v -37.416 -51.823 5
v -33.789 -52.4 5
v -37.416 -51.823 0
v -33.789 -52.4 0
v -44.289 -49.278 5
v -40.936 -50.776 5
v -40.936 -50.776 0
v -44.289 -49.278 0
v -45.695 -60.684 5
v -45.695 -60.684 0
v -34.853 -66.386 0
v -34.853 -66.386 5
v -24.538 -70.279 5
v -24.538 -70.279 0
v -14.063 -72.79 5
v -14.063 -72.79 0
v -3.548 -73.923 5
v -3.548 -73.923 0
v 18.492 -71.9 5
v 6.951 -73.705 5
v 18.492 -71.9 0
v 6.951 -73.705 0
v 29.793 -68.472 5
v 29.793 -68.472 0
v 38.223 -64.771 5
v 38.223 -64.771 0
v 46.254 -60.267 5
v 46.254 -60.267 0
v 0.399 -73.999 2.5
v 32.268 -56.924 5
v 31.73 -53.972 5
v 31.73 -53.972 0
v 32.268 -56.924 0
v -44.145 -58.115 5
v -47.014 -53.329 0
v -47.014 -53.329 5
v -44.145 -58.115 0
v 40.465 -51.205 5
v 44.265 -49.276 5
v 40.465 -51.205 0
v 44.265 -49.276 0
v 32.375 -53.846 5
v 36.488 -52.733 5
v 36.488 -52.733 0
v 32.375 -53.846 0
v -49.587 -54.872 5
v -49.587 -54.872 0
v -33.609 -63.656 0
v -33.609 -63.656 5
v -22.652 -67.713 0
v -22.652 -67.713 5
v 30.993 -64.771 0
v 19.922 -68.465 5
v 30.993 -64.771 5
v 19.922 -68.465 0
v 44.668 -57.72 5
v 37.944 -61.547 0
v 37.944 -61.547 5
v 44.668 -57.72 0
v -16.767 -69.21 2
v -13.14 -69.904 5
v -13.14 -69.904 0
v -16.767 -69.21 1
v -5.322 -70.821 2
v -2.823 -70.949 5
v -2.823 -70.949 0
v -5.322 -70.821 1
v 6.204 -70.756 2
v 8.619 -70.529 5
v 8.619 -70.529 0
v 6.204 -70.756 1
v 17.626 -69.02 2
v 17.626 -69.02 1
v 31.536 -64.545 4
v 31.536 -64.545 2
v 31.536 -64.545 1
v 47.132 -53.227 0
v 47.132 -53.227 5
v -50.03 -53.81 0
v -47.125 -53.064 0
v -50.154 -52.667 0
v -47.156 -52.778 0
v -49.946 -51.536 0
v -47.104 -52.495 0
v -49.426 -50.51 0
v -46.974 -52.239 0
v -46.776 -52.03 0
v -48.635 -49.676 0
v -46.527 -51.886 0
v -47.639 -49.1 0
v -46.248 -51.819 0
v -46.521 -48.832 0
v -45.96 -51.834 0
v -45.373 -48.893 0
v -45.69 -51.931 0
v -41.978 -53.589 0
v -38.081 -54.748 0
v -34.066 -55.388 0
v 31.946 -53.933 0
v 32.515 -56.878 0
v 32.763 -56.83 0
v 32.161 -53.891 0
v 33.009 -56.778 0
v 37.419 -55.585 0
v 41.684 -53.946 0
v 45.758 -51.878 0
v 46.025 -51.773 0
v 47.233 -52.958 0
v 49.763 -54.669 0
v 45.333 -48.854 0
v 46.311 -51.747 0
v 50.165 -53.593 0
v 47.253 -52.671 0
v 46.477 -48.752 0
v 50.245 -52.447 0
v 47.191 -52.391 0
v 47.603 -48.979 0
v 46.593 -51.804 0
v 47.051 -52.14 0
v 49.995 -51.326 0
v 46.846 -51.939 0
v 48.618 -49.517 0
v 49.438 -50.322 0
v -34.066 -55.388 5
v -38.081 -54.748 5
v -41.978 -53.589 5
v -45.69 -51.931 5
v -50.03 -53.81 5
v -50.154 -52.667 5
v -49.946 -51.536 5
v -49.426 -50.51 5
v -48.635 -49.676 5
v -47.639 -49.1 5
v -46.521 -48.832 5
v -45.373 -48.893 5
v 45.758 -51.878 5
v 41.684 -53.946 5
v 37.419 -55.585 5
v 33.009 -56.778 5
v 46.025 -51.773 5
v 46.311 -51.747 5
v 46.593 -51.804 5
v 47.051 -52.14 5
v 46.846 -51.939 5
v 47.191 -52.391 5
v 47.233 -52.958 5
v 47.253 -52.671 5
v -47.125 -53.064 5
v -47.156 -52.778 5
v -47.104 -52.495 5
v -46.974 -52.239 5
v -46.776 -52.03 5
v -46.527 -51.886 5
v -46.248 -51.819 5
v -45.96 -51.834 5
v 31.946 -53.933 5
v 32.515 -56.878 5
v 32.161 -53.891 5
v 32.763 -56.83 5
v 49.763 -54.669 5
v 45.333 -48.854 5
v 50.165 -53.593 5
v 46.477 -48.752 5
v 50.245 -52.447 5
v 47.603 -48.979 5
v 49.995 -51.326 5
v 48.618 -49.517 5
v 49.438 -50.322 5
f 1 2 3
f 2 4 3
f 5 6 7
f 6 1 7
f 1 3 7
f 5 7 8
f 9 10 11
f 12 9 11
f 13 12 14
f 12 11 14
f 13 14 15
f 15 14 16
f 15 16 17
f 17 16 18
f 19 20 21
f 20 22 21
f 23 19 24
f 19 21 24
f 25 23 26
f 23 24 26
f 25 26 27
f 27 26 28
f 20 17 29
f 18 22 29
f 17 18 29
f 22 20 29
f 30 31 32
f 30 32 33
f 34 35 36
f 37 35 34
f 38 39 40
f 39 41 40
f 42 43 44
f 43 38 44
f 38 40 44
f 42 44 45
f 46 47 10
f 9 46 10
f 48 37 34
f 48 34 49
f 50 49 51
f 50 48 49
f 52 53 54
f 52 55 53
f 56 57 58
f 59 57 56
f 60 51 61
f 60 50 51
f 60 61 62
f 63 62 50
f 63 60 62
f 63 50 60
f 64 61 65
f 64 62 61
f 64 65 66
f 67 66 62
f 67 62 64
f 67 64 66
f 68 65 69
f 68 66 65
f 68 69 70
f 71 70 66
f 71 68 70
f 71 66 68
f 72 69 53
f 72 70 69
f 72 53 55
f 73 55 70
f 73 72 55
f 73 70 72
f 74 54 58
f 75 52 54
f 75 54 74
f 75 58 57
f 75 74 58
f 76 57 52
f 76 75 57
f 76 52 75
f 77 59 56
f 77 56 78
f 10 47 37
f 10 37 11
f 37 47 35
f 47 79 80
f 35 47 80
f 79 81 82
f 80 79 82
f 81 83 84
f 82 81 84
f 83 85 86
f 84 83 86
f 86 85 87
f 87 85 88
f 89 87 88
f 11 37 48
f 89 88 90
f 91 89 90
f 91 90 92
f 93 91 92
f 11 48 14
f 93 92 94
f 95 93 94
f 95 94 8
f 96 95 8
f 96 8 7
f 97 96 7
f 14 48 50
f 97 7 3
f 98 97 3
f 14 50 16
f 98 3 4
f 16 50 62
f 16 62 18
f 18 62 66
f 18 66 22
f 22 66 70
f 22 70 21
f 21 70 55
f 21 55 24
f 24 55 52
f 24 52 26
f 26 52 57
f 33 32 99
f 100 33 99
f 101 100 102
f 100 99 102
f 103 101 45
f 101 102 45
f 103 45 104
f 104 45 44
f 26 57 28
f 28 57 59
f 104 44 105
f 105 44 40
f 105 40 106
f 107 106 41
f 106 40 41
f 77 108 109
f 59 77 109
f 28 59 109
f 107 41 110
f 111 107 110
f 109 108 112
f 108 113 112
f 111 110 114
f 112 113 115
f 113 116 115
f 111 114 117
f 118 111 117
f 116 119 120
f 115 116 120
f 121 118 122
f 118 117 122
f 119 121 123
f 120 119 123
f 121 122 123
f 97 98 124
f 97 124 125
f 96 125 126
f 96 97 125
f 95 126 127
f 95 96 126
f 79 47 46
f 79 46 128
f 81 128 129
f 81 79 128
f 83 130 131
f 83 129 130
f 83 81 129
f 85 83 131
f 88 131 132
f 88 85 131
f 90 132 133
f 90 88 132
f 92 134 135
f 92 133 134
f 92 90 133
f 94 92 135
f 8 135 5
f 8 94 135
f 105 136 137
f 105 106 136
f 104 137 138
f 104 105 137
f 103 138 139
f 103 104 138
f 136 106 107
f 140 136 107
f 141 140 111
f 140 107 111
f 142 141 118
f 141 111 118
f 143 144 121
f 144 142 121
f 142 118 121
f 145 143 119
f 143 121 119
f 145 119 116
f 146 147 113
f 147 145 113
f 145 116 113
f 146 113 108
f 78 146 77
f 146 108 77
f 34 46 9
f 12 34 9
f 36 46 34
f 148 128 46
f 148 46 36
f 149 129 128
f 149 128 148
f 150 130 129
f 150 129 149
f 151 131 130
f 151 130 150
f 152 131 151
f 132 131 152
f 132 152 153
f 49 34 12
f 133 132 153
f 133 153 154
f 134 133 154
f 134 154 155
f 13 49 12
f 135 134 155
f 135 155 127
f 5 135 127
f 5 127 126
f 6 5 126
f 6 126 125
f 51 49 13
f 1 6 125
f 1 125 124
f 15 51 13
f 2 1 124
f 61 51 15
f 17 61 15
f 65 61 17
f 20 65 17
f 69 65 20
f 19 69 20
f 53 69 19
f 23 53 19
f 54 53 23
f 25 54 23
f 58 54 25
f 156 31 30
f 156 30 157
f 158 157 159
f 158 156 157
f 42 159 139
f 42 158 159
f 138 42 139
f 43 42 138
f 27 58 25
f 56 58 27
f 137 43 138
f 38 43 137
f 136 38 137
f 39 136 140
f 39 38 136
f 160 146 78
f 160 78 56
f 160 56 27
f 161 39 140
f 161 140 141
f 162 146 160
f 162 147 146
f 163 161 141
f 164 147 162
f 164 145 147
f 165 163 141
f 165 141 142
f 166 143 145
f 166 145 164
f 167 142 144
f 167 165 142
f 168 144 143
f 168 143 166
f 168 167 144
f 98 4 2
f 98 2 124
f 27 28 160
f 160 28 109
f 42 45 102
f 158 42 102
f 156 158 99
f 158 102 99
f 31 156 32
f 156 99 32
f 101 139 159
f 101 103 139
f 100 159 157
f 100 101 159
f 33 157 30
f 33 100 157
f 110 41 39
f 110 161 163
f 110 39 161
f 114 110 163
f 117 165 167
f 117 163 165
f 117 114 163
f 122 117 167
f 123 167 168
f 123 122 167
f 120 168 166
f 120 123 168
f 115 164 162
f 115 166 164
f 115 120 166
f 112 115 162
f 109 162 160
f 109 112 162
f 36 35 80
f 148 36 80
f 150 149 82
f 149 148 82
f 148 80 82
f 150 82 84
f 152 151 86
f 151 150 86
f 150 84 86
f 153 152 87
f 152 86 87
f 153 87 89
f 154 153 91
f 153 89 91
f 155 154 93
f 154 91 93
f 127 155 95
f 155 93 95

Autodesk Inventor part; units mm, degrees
ref_plane "YZ Plane" through (0, 0, 0) normal (1, 0, 0) x (0, 1, 0)
ref_plane "XZ Plane" through (0, 0, 0) normal (0, 1, 0) x (-1, 0, 0)
ref_plane "XY Plane" through (0, 0, 0) normal (0, 0, 1) x (1, 0, 0)
sketch "スケッチ1" plane through (0, 0, 0) normal (0, 0, 1) x (1, 0, 0)
  arc A0 (47.1325, -53.2266) -> (45.758, -51.8784) centre (46.2557, -52.7457) ccw
  arc A1 (33.009, -56.7784) -> (45.758, -51.8784) centre (23.6069, -13.28) ccw
  arc A2 (11.1932, -28.6204) -> (33.009, -56.7784) centre (28.8377, -37.4801) ccw
  arc A3 (11.1932, -28.6204) -> (-11.1841, -28.6384) centre (0, -23) ccw
  arc A4 (-22.0046, -54.1258) -> (-11.1841, -28.6384) centre (-27.3796, -36.8033) ccw
  arc A5 (-45.6895, -51.9306) -> (-22.0046, -54.1258) centre (-31.2017, -24.4856) ccw
  arc A6 (-45.6895, -51.9306) -> (-47.014, -53.3291) centre (-46.1563, -52.815) ccw
  line L0 (-47.014, -53.3291) -> (-44.145, -58.1151)
  spline S0 degree 4 poles (-44.145, -58.1151) (-43.8381, -58.3003) (-43.4088, -58.5568) (-42.8575, -58.8816) (-42.1841, -59.2711) (-41.6963, -59.5497) (-41.2094, -59.8243) (-40.7232, -60.0949) (-40.2377, -60.3617) (-39.7528, -60.6247) (-39.2684, -60.8839) (-38.7844, -61.1395) (-38.3007, -61.3914) (-37.8172, -61.6398) (-37.334, -61.8846) (-36.8508, -62.1259) (-36.3678, -62.3637) (-35.8847, -62.5981) (-35.4015, -62.8291) (-34.9183, -63.0567) (-34.4349, -63.281) (-33.9513, -63.502) (-33.4675, -63.7196) (-32.9834, -63.934) (-32.499, -64.1451) (-32.0143, -64.3529) (-31.5292, -64.5576) (-31.0437, -64.7589) (-30.5578, -64.9571) (-30.0715, -65.1521) (-29.5847, -65.3439) (-29.0974, -65.5325) (-28.6097, -65.7179) (-28.1214, -65.9001) (-27.6326, -66.0792) (-27.1433, -66.2551) (-26.6534, -66.4278) (-26.163, -66.5974) (-25.6721, -66.7638) (-25.1806, -66.927) (-24.6885, -67.0871) (-24.1958, -67.244) (-23.7026, -67.3978) (-23.2087, -67.5484) (-22.7144, -67.6958) (-22.2194, -67.8401) (-21.7238, -67.9811) (-21.2277, -68.1191) (-20.7311, -68.2538) (-20.2338, -68.3854) (-19.736, -68.5137) (-19.2377, -68.6389) (-18.7388, -68.7609) (-18.2393, -68.8798) (-17.7394, -68.9954) (-17.2389, -69.1078) (-16.7379, -69.217) (-16.2363, -69.323) (-15.7343, -69.4258) (-15.2318, -69.5254) (-14.7289, -69.6218) (-14.2255, -69.7149) (-13.7216, -69.8049) (-13.2173, -69.8915) (-12.7125, -69.975) (-12.2074, -70.0552) (-11.7018, -70.1322) (-11.1959, -70.2059) (-10.6896, -70.2764) (-10.1829, -70.3436) (-9.6759, -70.4075) (-9.1686, -70.4683) (-8.661, -70.5257) (-8.1531, -70.5799) (-7.6449, -70.6308) (-7.1364, -70.6784) (-6.6277, -70.7228) (-6.1188, -70.7639) (-5.6096, -70.8017) (-5.1003, -70.8362) (-4.5907, -70.8674) (-4.0811, -70.8954) (-3.5712, -70.9201) (-3.0613, -70.9415) (-2.5513, -70.9596) (-2.0411, -70.9744) (-1.5309, -70.9859) (-1.0206, -70.9941) (-0.5103, -70.9991) (0, -71.0007) (0.5103, -70.9991) (1.0206, -70.9941) (1.5309, -70.9859) (2.0411, -70.9744) (2.5512, -70.9596) (3.0613, -70.9415) (3.5712, -70.9201) (4.0811, -70.8954) (4.5907, -70.8674) (5.1002, -70.8362) (5.6096, -70.8017) (6.1187, -70.7639) (6.6276, -70.7228) (7.1363, -70.6784) (7.6447, -70.6308) (8.1529, -70.5799) (8.6608, -70.5257) (9.1683, -70.4683) (9.6756, -70.4076) (10.1825, -70.3436) (10.6891, -70.2764) (11.1953, -70.2059) (11.7011, -70.1322) (12.2065, -70.0553) (12.7115, -69.9751) (13.2161, -69.8917) (13.7202, -69.805) (14.2238, -69.7151) (14.727, -69.622) (15.2297, -69.5257) (15.7318, -69.4261) (16.2335, -69.3234) (16.7346, -69.2175) (17.2352, -69.1083) (17.7352, -68.996) (18.2346, -68.8805) (18.7335, -68.7617) (19.2317, -68.6399) (19.7293, -68.5148) (20.2264, -68.3866) (20.7227, -68.2552) (21.2185, -68.1207) (21.7136, -67.983) (22.208, -67.8421) (22.7018, -67.6981) (23.1948, -67.551) (23.6872, -67.4008) (24.1789, -67.2474) (24.6699, -67.0909) (25.1602, -66.9313) (25.6497, -66.7686) (26.1386, -66.6028) (26.6267, -66.4339) (27.1141, -66.2618) (27.6008, -66.0867) (28.0867, -65.9085) (28.5719, -65.7272) (29.0563, -65.5428) (29.54, -65.3554) (30.023, -65.1648) (30.5052, -64.9712) (30.9867, -64.7745) (31.4674, -64.5748) (31.9475, -64.3719) (32.4267, -64.166) (32.9053, -63.9571) (33.3831, -63.745) (33.8603, -63.5299) (34.3367, -63.3117) (34.8124, -63.0904) (35.2875, -62.8661) (35.7619, -62.6386) (36.2356, -62.4081) (36.7086, -62.1745) (37.181, -61.9378) (37.6528, -61.698) (38.124, -61.455) (38.5946, -61.209) (39.0646, -60.9598) (39.5341, -60.7075) (40.003, -60.452) (40.4714, -60.1934) (40.9394, -59.9316) (41.4069, -59.6666) (41.8739, -59.3984) (42.3406, -59.127) (42.8069, -58.8523) (43.4481, -58.4698) (43.9715, -58.1517) (44.3779, -57.9011) (44.6679, -57.7205) knots 0 0 0 0 0 0.014541 0.020333 0.02611 0.031872 0.03762 0.043355 0.049078 0.054789 0.060489 0.066178 0.071857 0.077527 0.083187 0.088839 0.094483 0.10012 0.105749 0.111371 0.116986 0.122595 0.128199 0.133797 0.139389 0.144976 0.150559 0.156136 0.16171 0.167279 0.172845 0.178407 0.183965 0.18952 0.195072 0.20062 0.206166 0.211709 0.21725 0.222788 0.228323 0.233857 0.239388 0.244918 0.250445 0.255971 0.261495 0.267017 0.272538 0.278057 0.283575 0.289092 0.294608 0.300122 0.305635 0.311147 0.316658 0.322169 0.327678 0.333186 0.338694 0.344201 0.349707 0.355213 0.360718 0.366222 0.371726 0.377229 0.382732 0.388235 0.393737 0.399238 0.404739 0.41024 0.415741 0.421241 0.426741 0.432241 0.43774 0.44324 0.448739 0.454238 0.459737 0.465236 0.470734 0.476233 0.481731 0.48723 0.492728 0.498227 0.503725 0.509224 0.514722 0.520221 0.525719 0.531218 0.536717 0.542216 0.547715 0.553214 0.558714 0.564214 0.569713 0.575214 0.580714 0.586215 0.591716 0.597217 0.602718 0.60822 0.613723 0.619225 0.624728 0.630232 0.635736 0.641241 0.646746 0.652251 0.657758 0.663264 0.668772 0.67428 0.679789 0.685299 0.690809 0.69632 0.701832 0.707345 0.712859 0.718374 0.72389 0.729407 0.734925 0.740444 0.745965 0.751487 0.75701 0.762535 0.768061 0.773588 0.779117 0.784648 0.790181 0.795715 0.801252 0.80679 0.812331 0.817873 0.823418 0.828965 0.834515 0.840067 0.845622 0.85118 0.85674 0.862304 0.867871 0.873441 0.879014 0.884591 0.890172 0.895757 0.901345 0.906938 0.912535 0.918137 0.923743 0.929355 0.934971 0.940593 0.946221 0.951854 0.957493 0.963139 0.968791 0.974449 0.980115 0.985788 1 1 1 1 1
  line L1 (44.6679, -57.7205) -> (47.1325, -53.2266)
  arc A7 (4.5969, -37.0887) -> (23.8174, -61.1986) centre (28.8377, -37.4801) ccw
  spline S1 degree 3 poles (23.923, -63.1268) (24.0467, -63.086) (24.1612, -63.0216) (24.3592, -62.8523) (24.4407, -62.7492) (24.5595, -62.5175) (24.5958, -62.3911) (24.6178, -62.1316) (24.6033, -62.0009) (24.5251, -61.7525) (24.4622, -61.6371) (24.3075, -61.4513) (24.2222, -61.3781) (24.0311, -61.2629) (23.9266, -61.2217) (23.8174, -61.1986) knots 0 0 0 0 0.148947 0.148947 0.297893 0.297893 0.44684 0.44684 0.595787 0.595787 0.744733 0.744733 0.872367 0.872367 1 1 1 1
  spline S2 degree 3 poles (23.923, -63.1268) (23.6264, -63.2244) (21.6991, -63.8462) (18.9298, -64.6237) (14.7719, -65.5721) (11.4157, -66.1631) (7.1944, -66.6887) (3.8013, -66.9375) (-0.4475, -67.0324) (-3.8473, -66.9351) (-8.0854, -66.5978) (-11.4616, -66.156) (-15.6527, -65.3916) (-18.978, -64.6118) (-23.0925, -63.431) (-25.7434, -62.5289) (-27.5645, -61.8359) (-27.7718, -61.756) knots -0.770978 -0.770978 -0.770978 -0.770978 -0.760435 -0.70257 -0.673637 -0.615772 -0.58684 -0.528974 -0.500042 -0.442177 -0.413244 -0.355379 -0.326446 -0.268581 -0.239649 -0.181783 -0.174342 -0.174342 -0.174342 -0.174342
  spline S3 degree 3 poles (-27.5161, -59.8282) (-27.6456, -59.8417) (-27.7712, -59.8804) (-28.0006, -60.0037) (-28.1022, -60.0872) (-28.2675, -60.2884) (-28.3298, -60.4042) (-28.4064, -60.6531) (-28.42, -60.7838) (-28.3964, -61.0432) (-28.3594, -61.1693) (-28.2435, -61.3919) (-28.1687, -61.4881) (-27.9885, -61.6491) (-27.8845, -61.7126) (-27.7718, -61.756) knots 0 0 0 0 0.145866 0.145866 0.291731 0.291731 0.437597 0.437597 0.583462 0.583462 0.729328 0.729328 0.864664 0.864664 1 1 1 1
  arc A8 (-27.5161, -59.8282) -> (-20.671, -58.4236) centre (-31.2017, -24.4856) ccw
  arc A9 (-20.671, -58.4236) -> (-4.7434, -37.0245) centre (-27.3796, -36.8033) ccw
  arc A10 (-3.4858, -36.0681) -> (-4.7434, -37.0245) centre (-3.7435, -37.0343) ccw
  arc A11 (-3.4858, -36.0681) -> (3.3494, -36.1037) centre (0, -23) ccw
  arc A12 (4.5969, -37.0887) -> (3.3494, -36.1037) centre (3.597, -37.0726) ccw
  circle A13 centre (0, -23) radius 8.525
  circle A14 centre (0, 0) radius 1.5
  circle A15 centre (-6.3066, -8.8137) radius 1.5
  line L2 (5.2372, 1.6799) -> (11.9265, -19.1744)
  arc A16 (5.2372, 1.6799) -> (-4.7491, 2.7742) centre (0, 0) ccw
  line L3 (-4.7491, 2.7742) -> (-10.1922, -6.5439)
  arc A17 (-10.1922, -6.5439) -> (-10.7715, -8.253) centre (-6.3066, -8.8137) ccw
  line L4 (-10.7715, -8.253) -> (-12.4274, -21.4394)
  arc A18 (11.9265, -19.1744) -> (-12.4274, -21.4394) centre (0, -23) ccw
  arc A19 (-9.0832, -7.6778) -> (-5.0879, -11.555) centre (-6.3066, -8.8137) ccw
  line L5 (-9.0832, -7.6778) -> (-4.9441, 2.4403)
sketch "スケッチ2" plane through (0, 0, 0) normal (0, 0, 1) x (1, 0, 0)
  spline S0 degree 4 poles (-44.145, -58.1151) (-37.6182, -62.054) (-28.2694, -66.5348) (-15.5407, -70.2705) (0.4425, -71.3509) (16.3869, -70.0942) (29.0453, -66.236) (38.314, -61.6764) (44.6679, -57.7205) knots 0 0 0 0 0 0.314296 0.438586 0.562663 0.686902 1 1 1 1 1
  arc A0 (-45.6895, -51.9306) -> (-47.014, -53.3292) centre (-46.1563, -52.815) ccw
  arc A1 (-45.6895, -51.9306) -> (-34.0657, -55.3875) centre (-31.2017, -24.4856) ccw
  arc A2 (-22.0045, -54.1258) -> (-11.1841, -28.6384) centre (-27.3796, -36.8033) ccw
  arc A3 (32.2678, -56.9238) -> (33.009, -56.7784) centre (28.8377, -37.4801) ccw
  arc A4 (33.009, -56.7784) -> (45.758, -51.8784) centre (23.6069, -13.28) ccw
  arc A5 (47.1325, -53.2266) -> (45.758, -51.8784) centre (46.2557, -52.7457) ccw
  arc A6 (-22.8936, -51.2605) -> (-13.8629, -29.9889) centre (-27.3796, -36.8033) ccw
  arc A7 (-44.289, -49.2776) -> (-33.7888, -52.4003) centre (-31.2017, -24.4856) ccw
  arc A8 (-44.289, -49.2776) -> (-49.5871, -54.8716) centre (-46.1563, -52.815) ccw
  arc A9 (31.7303, -53.9723) -> (32.3752, -53.8461) centre (28.8377, -37.4801) ccw
  arc A10 (32.3752, -53.8461) -> (44.2648, -49.2764) centre (23.6069, -13.28) ccw
  arc A11 (49.7629, -54.6691) -> (44.2648, -49.2764) centre (46.2557, -52.7457) ccw
  line L0 (-49.5871, -54.8716) -> (-45.6951, -60.6836)
  line L1 (46.2535, -60.2673) -> (49.7629, -54.6691)
  line L2 (-33.7888, -52.4003) -> (-34.0657, -55.3875)
  line L3 (-47.014, -53.3292) -> (-44.145, -58.1151)
  line L4 (44.6679, -57.7205) -> (47.1325, -53.2266)
  line L5 (31.7303, -53.9723) -> (32.2678, -56.9238)
  spline S1 degree 5 poles (-45.6951, -60.6836) (-37.3741, -65.7056) (-28.5032, -69.8262) (-19.0469, -72.6542) (0.3831, -75.4348) (19.7882, -72.4725) (29.1916, -69.5658) (38.0209, -65.3927) (46.2535, -60.2673) knots 0 0 0 0 0 0 0.500557 0.500557 0.500557 1 1 1 1 1 1
  point P0 (0, 0)
  point P1 (11.1932, -28.6204)
  point P2 (-33.3656, -63.7642)
  point P3 (-22.3576, -67.7993)
  point P4 (-11.0481, -70.226)
  point P5 (0.4419, -70.9986)
  point P6 (11.9239, -70.0979)
  point P7 (23.204, -67.5475)
  point P8 (34.1337, -63.4043)
  dimension "d0" = 3
  dimension "d1" = 3
  dimension "d2" = 3
extrude "押し出し1" add sketch "スケッチ2" along normal blind 5
properties part number "脚ゴム" material "ゴム、シリコーン"
